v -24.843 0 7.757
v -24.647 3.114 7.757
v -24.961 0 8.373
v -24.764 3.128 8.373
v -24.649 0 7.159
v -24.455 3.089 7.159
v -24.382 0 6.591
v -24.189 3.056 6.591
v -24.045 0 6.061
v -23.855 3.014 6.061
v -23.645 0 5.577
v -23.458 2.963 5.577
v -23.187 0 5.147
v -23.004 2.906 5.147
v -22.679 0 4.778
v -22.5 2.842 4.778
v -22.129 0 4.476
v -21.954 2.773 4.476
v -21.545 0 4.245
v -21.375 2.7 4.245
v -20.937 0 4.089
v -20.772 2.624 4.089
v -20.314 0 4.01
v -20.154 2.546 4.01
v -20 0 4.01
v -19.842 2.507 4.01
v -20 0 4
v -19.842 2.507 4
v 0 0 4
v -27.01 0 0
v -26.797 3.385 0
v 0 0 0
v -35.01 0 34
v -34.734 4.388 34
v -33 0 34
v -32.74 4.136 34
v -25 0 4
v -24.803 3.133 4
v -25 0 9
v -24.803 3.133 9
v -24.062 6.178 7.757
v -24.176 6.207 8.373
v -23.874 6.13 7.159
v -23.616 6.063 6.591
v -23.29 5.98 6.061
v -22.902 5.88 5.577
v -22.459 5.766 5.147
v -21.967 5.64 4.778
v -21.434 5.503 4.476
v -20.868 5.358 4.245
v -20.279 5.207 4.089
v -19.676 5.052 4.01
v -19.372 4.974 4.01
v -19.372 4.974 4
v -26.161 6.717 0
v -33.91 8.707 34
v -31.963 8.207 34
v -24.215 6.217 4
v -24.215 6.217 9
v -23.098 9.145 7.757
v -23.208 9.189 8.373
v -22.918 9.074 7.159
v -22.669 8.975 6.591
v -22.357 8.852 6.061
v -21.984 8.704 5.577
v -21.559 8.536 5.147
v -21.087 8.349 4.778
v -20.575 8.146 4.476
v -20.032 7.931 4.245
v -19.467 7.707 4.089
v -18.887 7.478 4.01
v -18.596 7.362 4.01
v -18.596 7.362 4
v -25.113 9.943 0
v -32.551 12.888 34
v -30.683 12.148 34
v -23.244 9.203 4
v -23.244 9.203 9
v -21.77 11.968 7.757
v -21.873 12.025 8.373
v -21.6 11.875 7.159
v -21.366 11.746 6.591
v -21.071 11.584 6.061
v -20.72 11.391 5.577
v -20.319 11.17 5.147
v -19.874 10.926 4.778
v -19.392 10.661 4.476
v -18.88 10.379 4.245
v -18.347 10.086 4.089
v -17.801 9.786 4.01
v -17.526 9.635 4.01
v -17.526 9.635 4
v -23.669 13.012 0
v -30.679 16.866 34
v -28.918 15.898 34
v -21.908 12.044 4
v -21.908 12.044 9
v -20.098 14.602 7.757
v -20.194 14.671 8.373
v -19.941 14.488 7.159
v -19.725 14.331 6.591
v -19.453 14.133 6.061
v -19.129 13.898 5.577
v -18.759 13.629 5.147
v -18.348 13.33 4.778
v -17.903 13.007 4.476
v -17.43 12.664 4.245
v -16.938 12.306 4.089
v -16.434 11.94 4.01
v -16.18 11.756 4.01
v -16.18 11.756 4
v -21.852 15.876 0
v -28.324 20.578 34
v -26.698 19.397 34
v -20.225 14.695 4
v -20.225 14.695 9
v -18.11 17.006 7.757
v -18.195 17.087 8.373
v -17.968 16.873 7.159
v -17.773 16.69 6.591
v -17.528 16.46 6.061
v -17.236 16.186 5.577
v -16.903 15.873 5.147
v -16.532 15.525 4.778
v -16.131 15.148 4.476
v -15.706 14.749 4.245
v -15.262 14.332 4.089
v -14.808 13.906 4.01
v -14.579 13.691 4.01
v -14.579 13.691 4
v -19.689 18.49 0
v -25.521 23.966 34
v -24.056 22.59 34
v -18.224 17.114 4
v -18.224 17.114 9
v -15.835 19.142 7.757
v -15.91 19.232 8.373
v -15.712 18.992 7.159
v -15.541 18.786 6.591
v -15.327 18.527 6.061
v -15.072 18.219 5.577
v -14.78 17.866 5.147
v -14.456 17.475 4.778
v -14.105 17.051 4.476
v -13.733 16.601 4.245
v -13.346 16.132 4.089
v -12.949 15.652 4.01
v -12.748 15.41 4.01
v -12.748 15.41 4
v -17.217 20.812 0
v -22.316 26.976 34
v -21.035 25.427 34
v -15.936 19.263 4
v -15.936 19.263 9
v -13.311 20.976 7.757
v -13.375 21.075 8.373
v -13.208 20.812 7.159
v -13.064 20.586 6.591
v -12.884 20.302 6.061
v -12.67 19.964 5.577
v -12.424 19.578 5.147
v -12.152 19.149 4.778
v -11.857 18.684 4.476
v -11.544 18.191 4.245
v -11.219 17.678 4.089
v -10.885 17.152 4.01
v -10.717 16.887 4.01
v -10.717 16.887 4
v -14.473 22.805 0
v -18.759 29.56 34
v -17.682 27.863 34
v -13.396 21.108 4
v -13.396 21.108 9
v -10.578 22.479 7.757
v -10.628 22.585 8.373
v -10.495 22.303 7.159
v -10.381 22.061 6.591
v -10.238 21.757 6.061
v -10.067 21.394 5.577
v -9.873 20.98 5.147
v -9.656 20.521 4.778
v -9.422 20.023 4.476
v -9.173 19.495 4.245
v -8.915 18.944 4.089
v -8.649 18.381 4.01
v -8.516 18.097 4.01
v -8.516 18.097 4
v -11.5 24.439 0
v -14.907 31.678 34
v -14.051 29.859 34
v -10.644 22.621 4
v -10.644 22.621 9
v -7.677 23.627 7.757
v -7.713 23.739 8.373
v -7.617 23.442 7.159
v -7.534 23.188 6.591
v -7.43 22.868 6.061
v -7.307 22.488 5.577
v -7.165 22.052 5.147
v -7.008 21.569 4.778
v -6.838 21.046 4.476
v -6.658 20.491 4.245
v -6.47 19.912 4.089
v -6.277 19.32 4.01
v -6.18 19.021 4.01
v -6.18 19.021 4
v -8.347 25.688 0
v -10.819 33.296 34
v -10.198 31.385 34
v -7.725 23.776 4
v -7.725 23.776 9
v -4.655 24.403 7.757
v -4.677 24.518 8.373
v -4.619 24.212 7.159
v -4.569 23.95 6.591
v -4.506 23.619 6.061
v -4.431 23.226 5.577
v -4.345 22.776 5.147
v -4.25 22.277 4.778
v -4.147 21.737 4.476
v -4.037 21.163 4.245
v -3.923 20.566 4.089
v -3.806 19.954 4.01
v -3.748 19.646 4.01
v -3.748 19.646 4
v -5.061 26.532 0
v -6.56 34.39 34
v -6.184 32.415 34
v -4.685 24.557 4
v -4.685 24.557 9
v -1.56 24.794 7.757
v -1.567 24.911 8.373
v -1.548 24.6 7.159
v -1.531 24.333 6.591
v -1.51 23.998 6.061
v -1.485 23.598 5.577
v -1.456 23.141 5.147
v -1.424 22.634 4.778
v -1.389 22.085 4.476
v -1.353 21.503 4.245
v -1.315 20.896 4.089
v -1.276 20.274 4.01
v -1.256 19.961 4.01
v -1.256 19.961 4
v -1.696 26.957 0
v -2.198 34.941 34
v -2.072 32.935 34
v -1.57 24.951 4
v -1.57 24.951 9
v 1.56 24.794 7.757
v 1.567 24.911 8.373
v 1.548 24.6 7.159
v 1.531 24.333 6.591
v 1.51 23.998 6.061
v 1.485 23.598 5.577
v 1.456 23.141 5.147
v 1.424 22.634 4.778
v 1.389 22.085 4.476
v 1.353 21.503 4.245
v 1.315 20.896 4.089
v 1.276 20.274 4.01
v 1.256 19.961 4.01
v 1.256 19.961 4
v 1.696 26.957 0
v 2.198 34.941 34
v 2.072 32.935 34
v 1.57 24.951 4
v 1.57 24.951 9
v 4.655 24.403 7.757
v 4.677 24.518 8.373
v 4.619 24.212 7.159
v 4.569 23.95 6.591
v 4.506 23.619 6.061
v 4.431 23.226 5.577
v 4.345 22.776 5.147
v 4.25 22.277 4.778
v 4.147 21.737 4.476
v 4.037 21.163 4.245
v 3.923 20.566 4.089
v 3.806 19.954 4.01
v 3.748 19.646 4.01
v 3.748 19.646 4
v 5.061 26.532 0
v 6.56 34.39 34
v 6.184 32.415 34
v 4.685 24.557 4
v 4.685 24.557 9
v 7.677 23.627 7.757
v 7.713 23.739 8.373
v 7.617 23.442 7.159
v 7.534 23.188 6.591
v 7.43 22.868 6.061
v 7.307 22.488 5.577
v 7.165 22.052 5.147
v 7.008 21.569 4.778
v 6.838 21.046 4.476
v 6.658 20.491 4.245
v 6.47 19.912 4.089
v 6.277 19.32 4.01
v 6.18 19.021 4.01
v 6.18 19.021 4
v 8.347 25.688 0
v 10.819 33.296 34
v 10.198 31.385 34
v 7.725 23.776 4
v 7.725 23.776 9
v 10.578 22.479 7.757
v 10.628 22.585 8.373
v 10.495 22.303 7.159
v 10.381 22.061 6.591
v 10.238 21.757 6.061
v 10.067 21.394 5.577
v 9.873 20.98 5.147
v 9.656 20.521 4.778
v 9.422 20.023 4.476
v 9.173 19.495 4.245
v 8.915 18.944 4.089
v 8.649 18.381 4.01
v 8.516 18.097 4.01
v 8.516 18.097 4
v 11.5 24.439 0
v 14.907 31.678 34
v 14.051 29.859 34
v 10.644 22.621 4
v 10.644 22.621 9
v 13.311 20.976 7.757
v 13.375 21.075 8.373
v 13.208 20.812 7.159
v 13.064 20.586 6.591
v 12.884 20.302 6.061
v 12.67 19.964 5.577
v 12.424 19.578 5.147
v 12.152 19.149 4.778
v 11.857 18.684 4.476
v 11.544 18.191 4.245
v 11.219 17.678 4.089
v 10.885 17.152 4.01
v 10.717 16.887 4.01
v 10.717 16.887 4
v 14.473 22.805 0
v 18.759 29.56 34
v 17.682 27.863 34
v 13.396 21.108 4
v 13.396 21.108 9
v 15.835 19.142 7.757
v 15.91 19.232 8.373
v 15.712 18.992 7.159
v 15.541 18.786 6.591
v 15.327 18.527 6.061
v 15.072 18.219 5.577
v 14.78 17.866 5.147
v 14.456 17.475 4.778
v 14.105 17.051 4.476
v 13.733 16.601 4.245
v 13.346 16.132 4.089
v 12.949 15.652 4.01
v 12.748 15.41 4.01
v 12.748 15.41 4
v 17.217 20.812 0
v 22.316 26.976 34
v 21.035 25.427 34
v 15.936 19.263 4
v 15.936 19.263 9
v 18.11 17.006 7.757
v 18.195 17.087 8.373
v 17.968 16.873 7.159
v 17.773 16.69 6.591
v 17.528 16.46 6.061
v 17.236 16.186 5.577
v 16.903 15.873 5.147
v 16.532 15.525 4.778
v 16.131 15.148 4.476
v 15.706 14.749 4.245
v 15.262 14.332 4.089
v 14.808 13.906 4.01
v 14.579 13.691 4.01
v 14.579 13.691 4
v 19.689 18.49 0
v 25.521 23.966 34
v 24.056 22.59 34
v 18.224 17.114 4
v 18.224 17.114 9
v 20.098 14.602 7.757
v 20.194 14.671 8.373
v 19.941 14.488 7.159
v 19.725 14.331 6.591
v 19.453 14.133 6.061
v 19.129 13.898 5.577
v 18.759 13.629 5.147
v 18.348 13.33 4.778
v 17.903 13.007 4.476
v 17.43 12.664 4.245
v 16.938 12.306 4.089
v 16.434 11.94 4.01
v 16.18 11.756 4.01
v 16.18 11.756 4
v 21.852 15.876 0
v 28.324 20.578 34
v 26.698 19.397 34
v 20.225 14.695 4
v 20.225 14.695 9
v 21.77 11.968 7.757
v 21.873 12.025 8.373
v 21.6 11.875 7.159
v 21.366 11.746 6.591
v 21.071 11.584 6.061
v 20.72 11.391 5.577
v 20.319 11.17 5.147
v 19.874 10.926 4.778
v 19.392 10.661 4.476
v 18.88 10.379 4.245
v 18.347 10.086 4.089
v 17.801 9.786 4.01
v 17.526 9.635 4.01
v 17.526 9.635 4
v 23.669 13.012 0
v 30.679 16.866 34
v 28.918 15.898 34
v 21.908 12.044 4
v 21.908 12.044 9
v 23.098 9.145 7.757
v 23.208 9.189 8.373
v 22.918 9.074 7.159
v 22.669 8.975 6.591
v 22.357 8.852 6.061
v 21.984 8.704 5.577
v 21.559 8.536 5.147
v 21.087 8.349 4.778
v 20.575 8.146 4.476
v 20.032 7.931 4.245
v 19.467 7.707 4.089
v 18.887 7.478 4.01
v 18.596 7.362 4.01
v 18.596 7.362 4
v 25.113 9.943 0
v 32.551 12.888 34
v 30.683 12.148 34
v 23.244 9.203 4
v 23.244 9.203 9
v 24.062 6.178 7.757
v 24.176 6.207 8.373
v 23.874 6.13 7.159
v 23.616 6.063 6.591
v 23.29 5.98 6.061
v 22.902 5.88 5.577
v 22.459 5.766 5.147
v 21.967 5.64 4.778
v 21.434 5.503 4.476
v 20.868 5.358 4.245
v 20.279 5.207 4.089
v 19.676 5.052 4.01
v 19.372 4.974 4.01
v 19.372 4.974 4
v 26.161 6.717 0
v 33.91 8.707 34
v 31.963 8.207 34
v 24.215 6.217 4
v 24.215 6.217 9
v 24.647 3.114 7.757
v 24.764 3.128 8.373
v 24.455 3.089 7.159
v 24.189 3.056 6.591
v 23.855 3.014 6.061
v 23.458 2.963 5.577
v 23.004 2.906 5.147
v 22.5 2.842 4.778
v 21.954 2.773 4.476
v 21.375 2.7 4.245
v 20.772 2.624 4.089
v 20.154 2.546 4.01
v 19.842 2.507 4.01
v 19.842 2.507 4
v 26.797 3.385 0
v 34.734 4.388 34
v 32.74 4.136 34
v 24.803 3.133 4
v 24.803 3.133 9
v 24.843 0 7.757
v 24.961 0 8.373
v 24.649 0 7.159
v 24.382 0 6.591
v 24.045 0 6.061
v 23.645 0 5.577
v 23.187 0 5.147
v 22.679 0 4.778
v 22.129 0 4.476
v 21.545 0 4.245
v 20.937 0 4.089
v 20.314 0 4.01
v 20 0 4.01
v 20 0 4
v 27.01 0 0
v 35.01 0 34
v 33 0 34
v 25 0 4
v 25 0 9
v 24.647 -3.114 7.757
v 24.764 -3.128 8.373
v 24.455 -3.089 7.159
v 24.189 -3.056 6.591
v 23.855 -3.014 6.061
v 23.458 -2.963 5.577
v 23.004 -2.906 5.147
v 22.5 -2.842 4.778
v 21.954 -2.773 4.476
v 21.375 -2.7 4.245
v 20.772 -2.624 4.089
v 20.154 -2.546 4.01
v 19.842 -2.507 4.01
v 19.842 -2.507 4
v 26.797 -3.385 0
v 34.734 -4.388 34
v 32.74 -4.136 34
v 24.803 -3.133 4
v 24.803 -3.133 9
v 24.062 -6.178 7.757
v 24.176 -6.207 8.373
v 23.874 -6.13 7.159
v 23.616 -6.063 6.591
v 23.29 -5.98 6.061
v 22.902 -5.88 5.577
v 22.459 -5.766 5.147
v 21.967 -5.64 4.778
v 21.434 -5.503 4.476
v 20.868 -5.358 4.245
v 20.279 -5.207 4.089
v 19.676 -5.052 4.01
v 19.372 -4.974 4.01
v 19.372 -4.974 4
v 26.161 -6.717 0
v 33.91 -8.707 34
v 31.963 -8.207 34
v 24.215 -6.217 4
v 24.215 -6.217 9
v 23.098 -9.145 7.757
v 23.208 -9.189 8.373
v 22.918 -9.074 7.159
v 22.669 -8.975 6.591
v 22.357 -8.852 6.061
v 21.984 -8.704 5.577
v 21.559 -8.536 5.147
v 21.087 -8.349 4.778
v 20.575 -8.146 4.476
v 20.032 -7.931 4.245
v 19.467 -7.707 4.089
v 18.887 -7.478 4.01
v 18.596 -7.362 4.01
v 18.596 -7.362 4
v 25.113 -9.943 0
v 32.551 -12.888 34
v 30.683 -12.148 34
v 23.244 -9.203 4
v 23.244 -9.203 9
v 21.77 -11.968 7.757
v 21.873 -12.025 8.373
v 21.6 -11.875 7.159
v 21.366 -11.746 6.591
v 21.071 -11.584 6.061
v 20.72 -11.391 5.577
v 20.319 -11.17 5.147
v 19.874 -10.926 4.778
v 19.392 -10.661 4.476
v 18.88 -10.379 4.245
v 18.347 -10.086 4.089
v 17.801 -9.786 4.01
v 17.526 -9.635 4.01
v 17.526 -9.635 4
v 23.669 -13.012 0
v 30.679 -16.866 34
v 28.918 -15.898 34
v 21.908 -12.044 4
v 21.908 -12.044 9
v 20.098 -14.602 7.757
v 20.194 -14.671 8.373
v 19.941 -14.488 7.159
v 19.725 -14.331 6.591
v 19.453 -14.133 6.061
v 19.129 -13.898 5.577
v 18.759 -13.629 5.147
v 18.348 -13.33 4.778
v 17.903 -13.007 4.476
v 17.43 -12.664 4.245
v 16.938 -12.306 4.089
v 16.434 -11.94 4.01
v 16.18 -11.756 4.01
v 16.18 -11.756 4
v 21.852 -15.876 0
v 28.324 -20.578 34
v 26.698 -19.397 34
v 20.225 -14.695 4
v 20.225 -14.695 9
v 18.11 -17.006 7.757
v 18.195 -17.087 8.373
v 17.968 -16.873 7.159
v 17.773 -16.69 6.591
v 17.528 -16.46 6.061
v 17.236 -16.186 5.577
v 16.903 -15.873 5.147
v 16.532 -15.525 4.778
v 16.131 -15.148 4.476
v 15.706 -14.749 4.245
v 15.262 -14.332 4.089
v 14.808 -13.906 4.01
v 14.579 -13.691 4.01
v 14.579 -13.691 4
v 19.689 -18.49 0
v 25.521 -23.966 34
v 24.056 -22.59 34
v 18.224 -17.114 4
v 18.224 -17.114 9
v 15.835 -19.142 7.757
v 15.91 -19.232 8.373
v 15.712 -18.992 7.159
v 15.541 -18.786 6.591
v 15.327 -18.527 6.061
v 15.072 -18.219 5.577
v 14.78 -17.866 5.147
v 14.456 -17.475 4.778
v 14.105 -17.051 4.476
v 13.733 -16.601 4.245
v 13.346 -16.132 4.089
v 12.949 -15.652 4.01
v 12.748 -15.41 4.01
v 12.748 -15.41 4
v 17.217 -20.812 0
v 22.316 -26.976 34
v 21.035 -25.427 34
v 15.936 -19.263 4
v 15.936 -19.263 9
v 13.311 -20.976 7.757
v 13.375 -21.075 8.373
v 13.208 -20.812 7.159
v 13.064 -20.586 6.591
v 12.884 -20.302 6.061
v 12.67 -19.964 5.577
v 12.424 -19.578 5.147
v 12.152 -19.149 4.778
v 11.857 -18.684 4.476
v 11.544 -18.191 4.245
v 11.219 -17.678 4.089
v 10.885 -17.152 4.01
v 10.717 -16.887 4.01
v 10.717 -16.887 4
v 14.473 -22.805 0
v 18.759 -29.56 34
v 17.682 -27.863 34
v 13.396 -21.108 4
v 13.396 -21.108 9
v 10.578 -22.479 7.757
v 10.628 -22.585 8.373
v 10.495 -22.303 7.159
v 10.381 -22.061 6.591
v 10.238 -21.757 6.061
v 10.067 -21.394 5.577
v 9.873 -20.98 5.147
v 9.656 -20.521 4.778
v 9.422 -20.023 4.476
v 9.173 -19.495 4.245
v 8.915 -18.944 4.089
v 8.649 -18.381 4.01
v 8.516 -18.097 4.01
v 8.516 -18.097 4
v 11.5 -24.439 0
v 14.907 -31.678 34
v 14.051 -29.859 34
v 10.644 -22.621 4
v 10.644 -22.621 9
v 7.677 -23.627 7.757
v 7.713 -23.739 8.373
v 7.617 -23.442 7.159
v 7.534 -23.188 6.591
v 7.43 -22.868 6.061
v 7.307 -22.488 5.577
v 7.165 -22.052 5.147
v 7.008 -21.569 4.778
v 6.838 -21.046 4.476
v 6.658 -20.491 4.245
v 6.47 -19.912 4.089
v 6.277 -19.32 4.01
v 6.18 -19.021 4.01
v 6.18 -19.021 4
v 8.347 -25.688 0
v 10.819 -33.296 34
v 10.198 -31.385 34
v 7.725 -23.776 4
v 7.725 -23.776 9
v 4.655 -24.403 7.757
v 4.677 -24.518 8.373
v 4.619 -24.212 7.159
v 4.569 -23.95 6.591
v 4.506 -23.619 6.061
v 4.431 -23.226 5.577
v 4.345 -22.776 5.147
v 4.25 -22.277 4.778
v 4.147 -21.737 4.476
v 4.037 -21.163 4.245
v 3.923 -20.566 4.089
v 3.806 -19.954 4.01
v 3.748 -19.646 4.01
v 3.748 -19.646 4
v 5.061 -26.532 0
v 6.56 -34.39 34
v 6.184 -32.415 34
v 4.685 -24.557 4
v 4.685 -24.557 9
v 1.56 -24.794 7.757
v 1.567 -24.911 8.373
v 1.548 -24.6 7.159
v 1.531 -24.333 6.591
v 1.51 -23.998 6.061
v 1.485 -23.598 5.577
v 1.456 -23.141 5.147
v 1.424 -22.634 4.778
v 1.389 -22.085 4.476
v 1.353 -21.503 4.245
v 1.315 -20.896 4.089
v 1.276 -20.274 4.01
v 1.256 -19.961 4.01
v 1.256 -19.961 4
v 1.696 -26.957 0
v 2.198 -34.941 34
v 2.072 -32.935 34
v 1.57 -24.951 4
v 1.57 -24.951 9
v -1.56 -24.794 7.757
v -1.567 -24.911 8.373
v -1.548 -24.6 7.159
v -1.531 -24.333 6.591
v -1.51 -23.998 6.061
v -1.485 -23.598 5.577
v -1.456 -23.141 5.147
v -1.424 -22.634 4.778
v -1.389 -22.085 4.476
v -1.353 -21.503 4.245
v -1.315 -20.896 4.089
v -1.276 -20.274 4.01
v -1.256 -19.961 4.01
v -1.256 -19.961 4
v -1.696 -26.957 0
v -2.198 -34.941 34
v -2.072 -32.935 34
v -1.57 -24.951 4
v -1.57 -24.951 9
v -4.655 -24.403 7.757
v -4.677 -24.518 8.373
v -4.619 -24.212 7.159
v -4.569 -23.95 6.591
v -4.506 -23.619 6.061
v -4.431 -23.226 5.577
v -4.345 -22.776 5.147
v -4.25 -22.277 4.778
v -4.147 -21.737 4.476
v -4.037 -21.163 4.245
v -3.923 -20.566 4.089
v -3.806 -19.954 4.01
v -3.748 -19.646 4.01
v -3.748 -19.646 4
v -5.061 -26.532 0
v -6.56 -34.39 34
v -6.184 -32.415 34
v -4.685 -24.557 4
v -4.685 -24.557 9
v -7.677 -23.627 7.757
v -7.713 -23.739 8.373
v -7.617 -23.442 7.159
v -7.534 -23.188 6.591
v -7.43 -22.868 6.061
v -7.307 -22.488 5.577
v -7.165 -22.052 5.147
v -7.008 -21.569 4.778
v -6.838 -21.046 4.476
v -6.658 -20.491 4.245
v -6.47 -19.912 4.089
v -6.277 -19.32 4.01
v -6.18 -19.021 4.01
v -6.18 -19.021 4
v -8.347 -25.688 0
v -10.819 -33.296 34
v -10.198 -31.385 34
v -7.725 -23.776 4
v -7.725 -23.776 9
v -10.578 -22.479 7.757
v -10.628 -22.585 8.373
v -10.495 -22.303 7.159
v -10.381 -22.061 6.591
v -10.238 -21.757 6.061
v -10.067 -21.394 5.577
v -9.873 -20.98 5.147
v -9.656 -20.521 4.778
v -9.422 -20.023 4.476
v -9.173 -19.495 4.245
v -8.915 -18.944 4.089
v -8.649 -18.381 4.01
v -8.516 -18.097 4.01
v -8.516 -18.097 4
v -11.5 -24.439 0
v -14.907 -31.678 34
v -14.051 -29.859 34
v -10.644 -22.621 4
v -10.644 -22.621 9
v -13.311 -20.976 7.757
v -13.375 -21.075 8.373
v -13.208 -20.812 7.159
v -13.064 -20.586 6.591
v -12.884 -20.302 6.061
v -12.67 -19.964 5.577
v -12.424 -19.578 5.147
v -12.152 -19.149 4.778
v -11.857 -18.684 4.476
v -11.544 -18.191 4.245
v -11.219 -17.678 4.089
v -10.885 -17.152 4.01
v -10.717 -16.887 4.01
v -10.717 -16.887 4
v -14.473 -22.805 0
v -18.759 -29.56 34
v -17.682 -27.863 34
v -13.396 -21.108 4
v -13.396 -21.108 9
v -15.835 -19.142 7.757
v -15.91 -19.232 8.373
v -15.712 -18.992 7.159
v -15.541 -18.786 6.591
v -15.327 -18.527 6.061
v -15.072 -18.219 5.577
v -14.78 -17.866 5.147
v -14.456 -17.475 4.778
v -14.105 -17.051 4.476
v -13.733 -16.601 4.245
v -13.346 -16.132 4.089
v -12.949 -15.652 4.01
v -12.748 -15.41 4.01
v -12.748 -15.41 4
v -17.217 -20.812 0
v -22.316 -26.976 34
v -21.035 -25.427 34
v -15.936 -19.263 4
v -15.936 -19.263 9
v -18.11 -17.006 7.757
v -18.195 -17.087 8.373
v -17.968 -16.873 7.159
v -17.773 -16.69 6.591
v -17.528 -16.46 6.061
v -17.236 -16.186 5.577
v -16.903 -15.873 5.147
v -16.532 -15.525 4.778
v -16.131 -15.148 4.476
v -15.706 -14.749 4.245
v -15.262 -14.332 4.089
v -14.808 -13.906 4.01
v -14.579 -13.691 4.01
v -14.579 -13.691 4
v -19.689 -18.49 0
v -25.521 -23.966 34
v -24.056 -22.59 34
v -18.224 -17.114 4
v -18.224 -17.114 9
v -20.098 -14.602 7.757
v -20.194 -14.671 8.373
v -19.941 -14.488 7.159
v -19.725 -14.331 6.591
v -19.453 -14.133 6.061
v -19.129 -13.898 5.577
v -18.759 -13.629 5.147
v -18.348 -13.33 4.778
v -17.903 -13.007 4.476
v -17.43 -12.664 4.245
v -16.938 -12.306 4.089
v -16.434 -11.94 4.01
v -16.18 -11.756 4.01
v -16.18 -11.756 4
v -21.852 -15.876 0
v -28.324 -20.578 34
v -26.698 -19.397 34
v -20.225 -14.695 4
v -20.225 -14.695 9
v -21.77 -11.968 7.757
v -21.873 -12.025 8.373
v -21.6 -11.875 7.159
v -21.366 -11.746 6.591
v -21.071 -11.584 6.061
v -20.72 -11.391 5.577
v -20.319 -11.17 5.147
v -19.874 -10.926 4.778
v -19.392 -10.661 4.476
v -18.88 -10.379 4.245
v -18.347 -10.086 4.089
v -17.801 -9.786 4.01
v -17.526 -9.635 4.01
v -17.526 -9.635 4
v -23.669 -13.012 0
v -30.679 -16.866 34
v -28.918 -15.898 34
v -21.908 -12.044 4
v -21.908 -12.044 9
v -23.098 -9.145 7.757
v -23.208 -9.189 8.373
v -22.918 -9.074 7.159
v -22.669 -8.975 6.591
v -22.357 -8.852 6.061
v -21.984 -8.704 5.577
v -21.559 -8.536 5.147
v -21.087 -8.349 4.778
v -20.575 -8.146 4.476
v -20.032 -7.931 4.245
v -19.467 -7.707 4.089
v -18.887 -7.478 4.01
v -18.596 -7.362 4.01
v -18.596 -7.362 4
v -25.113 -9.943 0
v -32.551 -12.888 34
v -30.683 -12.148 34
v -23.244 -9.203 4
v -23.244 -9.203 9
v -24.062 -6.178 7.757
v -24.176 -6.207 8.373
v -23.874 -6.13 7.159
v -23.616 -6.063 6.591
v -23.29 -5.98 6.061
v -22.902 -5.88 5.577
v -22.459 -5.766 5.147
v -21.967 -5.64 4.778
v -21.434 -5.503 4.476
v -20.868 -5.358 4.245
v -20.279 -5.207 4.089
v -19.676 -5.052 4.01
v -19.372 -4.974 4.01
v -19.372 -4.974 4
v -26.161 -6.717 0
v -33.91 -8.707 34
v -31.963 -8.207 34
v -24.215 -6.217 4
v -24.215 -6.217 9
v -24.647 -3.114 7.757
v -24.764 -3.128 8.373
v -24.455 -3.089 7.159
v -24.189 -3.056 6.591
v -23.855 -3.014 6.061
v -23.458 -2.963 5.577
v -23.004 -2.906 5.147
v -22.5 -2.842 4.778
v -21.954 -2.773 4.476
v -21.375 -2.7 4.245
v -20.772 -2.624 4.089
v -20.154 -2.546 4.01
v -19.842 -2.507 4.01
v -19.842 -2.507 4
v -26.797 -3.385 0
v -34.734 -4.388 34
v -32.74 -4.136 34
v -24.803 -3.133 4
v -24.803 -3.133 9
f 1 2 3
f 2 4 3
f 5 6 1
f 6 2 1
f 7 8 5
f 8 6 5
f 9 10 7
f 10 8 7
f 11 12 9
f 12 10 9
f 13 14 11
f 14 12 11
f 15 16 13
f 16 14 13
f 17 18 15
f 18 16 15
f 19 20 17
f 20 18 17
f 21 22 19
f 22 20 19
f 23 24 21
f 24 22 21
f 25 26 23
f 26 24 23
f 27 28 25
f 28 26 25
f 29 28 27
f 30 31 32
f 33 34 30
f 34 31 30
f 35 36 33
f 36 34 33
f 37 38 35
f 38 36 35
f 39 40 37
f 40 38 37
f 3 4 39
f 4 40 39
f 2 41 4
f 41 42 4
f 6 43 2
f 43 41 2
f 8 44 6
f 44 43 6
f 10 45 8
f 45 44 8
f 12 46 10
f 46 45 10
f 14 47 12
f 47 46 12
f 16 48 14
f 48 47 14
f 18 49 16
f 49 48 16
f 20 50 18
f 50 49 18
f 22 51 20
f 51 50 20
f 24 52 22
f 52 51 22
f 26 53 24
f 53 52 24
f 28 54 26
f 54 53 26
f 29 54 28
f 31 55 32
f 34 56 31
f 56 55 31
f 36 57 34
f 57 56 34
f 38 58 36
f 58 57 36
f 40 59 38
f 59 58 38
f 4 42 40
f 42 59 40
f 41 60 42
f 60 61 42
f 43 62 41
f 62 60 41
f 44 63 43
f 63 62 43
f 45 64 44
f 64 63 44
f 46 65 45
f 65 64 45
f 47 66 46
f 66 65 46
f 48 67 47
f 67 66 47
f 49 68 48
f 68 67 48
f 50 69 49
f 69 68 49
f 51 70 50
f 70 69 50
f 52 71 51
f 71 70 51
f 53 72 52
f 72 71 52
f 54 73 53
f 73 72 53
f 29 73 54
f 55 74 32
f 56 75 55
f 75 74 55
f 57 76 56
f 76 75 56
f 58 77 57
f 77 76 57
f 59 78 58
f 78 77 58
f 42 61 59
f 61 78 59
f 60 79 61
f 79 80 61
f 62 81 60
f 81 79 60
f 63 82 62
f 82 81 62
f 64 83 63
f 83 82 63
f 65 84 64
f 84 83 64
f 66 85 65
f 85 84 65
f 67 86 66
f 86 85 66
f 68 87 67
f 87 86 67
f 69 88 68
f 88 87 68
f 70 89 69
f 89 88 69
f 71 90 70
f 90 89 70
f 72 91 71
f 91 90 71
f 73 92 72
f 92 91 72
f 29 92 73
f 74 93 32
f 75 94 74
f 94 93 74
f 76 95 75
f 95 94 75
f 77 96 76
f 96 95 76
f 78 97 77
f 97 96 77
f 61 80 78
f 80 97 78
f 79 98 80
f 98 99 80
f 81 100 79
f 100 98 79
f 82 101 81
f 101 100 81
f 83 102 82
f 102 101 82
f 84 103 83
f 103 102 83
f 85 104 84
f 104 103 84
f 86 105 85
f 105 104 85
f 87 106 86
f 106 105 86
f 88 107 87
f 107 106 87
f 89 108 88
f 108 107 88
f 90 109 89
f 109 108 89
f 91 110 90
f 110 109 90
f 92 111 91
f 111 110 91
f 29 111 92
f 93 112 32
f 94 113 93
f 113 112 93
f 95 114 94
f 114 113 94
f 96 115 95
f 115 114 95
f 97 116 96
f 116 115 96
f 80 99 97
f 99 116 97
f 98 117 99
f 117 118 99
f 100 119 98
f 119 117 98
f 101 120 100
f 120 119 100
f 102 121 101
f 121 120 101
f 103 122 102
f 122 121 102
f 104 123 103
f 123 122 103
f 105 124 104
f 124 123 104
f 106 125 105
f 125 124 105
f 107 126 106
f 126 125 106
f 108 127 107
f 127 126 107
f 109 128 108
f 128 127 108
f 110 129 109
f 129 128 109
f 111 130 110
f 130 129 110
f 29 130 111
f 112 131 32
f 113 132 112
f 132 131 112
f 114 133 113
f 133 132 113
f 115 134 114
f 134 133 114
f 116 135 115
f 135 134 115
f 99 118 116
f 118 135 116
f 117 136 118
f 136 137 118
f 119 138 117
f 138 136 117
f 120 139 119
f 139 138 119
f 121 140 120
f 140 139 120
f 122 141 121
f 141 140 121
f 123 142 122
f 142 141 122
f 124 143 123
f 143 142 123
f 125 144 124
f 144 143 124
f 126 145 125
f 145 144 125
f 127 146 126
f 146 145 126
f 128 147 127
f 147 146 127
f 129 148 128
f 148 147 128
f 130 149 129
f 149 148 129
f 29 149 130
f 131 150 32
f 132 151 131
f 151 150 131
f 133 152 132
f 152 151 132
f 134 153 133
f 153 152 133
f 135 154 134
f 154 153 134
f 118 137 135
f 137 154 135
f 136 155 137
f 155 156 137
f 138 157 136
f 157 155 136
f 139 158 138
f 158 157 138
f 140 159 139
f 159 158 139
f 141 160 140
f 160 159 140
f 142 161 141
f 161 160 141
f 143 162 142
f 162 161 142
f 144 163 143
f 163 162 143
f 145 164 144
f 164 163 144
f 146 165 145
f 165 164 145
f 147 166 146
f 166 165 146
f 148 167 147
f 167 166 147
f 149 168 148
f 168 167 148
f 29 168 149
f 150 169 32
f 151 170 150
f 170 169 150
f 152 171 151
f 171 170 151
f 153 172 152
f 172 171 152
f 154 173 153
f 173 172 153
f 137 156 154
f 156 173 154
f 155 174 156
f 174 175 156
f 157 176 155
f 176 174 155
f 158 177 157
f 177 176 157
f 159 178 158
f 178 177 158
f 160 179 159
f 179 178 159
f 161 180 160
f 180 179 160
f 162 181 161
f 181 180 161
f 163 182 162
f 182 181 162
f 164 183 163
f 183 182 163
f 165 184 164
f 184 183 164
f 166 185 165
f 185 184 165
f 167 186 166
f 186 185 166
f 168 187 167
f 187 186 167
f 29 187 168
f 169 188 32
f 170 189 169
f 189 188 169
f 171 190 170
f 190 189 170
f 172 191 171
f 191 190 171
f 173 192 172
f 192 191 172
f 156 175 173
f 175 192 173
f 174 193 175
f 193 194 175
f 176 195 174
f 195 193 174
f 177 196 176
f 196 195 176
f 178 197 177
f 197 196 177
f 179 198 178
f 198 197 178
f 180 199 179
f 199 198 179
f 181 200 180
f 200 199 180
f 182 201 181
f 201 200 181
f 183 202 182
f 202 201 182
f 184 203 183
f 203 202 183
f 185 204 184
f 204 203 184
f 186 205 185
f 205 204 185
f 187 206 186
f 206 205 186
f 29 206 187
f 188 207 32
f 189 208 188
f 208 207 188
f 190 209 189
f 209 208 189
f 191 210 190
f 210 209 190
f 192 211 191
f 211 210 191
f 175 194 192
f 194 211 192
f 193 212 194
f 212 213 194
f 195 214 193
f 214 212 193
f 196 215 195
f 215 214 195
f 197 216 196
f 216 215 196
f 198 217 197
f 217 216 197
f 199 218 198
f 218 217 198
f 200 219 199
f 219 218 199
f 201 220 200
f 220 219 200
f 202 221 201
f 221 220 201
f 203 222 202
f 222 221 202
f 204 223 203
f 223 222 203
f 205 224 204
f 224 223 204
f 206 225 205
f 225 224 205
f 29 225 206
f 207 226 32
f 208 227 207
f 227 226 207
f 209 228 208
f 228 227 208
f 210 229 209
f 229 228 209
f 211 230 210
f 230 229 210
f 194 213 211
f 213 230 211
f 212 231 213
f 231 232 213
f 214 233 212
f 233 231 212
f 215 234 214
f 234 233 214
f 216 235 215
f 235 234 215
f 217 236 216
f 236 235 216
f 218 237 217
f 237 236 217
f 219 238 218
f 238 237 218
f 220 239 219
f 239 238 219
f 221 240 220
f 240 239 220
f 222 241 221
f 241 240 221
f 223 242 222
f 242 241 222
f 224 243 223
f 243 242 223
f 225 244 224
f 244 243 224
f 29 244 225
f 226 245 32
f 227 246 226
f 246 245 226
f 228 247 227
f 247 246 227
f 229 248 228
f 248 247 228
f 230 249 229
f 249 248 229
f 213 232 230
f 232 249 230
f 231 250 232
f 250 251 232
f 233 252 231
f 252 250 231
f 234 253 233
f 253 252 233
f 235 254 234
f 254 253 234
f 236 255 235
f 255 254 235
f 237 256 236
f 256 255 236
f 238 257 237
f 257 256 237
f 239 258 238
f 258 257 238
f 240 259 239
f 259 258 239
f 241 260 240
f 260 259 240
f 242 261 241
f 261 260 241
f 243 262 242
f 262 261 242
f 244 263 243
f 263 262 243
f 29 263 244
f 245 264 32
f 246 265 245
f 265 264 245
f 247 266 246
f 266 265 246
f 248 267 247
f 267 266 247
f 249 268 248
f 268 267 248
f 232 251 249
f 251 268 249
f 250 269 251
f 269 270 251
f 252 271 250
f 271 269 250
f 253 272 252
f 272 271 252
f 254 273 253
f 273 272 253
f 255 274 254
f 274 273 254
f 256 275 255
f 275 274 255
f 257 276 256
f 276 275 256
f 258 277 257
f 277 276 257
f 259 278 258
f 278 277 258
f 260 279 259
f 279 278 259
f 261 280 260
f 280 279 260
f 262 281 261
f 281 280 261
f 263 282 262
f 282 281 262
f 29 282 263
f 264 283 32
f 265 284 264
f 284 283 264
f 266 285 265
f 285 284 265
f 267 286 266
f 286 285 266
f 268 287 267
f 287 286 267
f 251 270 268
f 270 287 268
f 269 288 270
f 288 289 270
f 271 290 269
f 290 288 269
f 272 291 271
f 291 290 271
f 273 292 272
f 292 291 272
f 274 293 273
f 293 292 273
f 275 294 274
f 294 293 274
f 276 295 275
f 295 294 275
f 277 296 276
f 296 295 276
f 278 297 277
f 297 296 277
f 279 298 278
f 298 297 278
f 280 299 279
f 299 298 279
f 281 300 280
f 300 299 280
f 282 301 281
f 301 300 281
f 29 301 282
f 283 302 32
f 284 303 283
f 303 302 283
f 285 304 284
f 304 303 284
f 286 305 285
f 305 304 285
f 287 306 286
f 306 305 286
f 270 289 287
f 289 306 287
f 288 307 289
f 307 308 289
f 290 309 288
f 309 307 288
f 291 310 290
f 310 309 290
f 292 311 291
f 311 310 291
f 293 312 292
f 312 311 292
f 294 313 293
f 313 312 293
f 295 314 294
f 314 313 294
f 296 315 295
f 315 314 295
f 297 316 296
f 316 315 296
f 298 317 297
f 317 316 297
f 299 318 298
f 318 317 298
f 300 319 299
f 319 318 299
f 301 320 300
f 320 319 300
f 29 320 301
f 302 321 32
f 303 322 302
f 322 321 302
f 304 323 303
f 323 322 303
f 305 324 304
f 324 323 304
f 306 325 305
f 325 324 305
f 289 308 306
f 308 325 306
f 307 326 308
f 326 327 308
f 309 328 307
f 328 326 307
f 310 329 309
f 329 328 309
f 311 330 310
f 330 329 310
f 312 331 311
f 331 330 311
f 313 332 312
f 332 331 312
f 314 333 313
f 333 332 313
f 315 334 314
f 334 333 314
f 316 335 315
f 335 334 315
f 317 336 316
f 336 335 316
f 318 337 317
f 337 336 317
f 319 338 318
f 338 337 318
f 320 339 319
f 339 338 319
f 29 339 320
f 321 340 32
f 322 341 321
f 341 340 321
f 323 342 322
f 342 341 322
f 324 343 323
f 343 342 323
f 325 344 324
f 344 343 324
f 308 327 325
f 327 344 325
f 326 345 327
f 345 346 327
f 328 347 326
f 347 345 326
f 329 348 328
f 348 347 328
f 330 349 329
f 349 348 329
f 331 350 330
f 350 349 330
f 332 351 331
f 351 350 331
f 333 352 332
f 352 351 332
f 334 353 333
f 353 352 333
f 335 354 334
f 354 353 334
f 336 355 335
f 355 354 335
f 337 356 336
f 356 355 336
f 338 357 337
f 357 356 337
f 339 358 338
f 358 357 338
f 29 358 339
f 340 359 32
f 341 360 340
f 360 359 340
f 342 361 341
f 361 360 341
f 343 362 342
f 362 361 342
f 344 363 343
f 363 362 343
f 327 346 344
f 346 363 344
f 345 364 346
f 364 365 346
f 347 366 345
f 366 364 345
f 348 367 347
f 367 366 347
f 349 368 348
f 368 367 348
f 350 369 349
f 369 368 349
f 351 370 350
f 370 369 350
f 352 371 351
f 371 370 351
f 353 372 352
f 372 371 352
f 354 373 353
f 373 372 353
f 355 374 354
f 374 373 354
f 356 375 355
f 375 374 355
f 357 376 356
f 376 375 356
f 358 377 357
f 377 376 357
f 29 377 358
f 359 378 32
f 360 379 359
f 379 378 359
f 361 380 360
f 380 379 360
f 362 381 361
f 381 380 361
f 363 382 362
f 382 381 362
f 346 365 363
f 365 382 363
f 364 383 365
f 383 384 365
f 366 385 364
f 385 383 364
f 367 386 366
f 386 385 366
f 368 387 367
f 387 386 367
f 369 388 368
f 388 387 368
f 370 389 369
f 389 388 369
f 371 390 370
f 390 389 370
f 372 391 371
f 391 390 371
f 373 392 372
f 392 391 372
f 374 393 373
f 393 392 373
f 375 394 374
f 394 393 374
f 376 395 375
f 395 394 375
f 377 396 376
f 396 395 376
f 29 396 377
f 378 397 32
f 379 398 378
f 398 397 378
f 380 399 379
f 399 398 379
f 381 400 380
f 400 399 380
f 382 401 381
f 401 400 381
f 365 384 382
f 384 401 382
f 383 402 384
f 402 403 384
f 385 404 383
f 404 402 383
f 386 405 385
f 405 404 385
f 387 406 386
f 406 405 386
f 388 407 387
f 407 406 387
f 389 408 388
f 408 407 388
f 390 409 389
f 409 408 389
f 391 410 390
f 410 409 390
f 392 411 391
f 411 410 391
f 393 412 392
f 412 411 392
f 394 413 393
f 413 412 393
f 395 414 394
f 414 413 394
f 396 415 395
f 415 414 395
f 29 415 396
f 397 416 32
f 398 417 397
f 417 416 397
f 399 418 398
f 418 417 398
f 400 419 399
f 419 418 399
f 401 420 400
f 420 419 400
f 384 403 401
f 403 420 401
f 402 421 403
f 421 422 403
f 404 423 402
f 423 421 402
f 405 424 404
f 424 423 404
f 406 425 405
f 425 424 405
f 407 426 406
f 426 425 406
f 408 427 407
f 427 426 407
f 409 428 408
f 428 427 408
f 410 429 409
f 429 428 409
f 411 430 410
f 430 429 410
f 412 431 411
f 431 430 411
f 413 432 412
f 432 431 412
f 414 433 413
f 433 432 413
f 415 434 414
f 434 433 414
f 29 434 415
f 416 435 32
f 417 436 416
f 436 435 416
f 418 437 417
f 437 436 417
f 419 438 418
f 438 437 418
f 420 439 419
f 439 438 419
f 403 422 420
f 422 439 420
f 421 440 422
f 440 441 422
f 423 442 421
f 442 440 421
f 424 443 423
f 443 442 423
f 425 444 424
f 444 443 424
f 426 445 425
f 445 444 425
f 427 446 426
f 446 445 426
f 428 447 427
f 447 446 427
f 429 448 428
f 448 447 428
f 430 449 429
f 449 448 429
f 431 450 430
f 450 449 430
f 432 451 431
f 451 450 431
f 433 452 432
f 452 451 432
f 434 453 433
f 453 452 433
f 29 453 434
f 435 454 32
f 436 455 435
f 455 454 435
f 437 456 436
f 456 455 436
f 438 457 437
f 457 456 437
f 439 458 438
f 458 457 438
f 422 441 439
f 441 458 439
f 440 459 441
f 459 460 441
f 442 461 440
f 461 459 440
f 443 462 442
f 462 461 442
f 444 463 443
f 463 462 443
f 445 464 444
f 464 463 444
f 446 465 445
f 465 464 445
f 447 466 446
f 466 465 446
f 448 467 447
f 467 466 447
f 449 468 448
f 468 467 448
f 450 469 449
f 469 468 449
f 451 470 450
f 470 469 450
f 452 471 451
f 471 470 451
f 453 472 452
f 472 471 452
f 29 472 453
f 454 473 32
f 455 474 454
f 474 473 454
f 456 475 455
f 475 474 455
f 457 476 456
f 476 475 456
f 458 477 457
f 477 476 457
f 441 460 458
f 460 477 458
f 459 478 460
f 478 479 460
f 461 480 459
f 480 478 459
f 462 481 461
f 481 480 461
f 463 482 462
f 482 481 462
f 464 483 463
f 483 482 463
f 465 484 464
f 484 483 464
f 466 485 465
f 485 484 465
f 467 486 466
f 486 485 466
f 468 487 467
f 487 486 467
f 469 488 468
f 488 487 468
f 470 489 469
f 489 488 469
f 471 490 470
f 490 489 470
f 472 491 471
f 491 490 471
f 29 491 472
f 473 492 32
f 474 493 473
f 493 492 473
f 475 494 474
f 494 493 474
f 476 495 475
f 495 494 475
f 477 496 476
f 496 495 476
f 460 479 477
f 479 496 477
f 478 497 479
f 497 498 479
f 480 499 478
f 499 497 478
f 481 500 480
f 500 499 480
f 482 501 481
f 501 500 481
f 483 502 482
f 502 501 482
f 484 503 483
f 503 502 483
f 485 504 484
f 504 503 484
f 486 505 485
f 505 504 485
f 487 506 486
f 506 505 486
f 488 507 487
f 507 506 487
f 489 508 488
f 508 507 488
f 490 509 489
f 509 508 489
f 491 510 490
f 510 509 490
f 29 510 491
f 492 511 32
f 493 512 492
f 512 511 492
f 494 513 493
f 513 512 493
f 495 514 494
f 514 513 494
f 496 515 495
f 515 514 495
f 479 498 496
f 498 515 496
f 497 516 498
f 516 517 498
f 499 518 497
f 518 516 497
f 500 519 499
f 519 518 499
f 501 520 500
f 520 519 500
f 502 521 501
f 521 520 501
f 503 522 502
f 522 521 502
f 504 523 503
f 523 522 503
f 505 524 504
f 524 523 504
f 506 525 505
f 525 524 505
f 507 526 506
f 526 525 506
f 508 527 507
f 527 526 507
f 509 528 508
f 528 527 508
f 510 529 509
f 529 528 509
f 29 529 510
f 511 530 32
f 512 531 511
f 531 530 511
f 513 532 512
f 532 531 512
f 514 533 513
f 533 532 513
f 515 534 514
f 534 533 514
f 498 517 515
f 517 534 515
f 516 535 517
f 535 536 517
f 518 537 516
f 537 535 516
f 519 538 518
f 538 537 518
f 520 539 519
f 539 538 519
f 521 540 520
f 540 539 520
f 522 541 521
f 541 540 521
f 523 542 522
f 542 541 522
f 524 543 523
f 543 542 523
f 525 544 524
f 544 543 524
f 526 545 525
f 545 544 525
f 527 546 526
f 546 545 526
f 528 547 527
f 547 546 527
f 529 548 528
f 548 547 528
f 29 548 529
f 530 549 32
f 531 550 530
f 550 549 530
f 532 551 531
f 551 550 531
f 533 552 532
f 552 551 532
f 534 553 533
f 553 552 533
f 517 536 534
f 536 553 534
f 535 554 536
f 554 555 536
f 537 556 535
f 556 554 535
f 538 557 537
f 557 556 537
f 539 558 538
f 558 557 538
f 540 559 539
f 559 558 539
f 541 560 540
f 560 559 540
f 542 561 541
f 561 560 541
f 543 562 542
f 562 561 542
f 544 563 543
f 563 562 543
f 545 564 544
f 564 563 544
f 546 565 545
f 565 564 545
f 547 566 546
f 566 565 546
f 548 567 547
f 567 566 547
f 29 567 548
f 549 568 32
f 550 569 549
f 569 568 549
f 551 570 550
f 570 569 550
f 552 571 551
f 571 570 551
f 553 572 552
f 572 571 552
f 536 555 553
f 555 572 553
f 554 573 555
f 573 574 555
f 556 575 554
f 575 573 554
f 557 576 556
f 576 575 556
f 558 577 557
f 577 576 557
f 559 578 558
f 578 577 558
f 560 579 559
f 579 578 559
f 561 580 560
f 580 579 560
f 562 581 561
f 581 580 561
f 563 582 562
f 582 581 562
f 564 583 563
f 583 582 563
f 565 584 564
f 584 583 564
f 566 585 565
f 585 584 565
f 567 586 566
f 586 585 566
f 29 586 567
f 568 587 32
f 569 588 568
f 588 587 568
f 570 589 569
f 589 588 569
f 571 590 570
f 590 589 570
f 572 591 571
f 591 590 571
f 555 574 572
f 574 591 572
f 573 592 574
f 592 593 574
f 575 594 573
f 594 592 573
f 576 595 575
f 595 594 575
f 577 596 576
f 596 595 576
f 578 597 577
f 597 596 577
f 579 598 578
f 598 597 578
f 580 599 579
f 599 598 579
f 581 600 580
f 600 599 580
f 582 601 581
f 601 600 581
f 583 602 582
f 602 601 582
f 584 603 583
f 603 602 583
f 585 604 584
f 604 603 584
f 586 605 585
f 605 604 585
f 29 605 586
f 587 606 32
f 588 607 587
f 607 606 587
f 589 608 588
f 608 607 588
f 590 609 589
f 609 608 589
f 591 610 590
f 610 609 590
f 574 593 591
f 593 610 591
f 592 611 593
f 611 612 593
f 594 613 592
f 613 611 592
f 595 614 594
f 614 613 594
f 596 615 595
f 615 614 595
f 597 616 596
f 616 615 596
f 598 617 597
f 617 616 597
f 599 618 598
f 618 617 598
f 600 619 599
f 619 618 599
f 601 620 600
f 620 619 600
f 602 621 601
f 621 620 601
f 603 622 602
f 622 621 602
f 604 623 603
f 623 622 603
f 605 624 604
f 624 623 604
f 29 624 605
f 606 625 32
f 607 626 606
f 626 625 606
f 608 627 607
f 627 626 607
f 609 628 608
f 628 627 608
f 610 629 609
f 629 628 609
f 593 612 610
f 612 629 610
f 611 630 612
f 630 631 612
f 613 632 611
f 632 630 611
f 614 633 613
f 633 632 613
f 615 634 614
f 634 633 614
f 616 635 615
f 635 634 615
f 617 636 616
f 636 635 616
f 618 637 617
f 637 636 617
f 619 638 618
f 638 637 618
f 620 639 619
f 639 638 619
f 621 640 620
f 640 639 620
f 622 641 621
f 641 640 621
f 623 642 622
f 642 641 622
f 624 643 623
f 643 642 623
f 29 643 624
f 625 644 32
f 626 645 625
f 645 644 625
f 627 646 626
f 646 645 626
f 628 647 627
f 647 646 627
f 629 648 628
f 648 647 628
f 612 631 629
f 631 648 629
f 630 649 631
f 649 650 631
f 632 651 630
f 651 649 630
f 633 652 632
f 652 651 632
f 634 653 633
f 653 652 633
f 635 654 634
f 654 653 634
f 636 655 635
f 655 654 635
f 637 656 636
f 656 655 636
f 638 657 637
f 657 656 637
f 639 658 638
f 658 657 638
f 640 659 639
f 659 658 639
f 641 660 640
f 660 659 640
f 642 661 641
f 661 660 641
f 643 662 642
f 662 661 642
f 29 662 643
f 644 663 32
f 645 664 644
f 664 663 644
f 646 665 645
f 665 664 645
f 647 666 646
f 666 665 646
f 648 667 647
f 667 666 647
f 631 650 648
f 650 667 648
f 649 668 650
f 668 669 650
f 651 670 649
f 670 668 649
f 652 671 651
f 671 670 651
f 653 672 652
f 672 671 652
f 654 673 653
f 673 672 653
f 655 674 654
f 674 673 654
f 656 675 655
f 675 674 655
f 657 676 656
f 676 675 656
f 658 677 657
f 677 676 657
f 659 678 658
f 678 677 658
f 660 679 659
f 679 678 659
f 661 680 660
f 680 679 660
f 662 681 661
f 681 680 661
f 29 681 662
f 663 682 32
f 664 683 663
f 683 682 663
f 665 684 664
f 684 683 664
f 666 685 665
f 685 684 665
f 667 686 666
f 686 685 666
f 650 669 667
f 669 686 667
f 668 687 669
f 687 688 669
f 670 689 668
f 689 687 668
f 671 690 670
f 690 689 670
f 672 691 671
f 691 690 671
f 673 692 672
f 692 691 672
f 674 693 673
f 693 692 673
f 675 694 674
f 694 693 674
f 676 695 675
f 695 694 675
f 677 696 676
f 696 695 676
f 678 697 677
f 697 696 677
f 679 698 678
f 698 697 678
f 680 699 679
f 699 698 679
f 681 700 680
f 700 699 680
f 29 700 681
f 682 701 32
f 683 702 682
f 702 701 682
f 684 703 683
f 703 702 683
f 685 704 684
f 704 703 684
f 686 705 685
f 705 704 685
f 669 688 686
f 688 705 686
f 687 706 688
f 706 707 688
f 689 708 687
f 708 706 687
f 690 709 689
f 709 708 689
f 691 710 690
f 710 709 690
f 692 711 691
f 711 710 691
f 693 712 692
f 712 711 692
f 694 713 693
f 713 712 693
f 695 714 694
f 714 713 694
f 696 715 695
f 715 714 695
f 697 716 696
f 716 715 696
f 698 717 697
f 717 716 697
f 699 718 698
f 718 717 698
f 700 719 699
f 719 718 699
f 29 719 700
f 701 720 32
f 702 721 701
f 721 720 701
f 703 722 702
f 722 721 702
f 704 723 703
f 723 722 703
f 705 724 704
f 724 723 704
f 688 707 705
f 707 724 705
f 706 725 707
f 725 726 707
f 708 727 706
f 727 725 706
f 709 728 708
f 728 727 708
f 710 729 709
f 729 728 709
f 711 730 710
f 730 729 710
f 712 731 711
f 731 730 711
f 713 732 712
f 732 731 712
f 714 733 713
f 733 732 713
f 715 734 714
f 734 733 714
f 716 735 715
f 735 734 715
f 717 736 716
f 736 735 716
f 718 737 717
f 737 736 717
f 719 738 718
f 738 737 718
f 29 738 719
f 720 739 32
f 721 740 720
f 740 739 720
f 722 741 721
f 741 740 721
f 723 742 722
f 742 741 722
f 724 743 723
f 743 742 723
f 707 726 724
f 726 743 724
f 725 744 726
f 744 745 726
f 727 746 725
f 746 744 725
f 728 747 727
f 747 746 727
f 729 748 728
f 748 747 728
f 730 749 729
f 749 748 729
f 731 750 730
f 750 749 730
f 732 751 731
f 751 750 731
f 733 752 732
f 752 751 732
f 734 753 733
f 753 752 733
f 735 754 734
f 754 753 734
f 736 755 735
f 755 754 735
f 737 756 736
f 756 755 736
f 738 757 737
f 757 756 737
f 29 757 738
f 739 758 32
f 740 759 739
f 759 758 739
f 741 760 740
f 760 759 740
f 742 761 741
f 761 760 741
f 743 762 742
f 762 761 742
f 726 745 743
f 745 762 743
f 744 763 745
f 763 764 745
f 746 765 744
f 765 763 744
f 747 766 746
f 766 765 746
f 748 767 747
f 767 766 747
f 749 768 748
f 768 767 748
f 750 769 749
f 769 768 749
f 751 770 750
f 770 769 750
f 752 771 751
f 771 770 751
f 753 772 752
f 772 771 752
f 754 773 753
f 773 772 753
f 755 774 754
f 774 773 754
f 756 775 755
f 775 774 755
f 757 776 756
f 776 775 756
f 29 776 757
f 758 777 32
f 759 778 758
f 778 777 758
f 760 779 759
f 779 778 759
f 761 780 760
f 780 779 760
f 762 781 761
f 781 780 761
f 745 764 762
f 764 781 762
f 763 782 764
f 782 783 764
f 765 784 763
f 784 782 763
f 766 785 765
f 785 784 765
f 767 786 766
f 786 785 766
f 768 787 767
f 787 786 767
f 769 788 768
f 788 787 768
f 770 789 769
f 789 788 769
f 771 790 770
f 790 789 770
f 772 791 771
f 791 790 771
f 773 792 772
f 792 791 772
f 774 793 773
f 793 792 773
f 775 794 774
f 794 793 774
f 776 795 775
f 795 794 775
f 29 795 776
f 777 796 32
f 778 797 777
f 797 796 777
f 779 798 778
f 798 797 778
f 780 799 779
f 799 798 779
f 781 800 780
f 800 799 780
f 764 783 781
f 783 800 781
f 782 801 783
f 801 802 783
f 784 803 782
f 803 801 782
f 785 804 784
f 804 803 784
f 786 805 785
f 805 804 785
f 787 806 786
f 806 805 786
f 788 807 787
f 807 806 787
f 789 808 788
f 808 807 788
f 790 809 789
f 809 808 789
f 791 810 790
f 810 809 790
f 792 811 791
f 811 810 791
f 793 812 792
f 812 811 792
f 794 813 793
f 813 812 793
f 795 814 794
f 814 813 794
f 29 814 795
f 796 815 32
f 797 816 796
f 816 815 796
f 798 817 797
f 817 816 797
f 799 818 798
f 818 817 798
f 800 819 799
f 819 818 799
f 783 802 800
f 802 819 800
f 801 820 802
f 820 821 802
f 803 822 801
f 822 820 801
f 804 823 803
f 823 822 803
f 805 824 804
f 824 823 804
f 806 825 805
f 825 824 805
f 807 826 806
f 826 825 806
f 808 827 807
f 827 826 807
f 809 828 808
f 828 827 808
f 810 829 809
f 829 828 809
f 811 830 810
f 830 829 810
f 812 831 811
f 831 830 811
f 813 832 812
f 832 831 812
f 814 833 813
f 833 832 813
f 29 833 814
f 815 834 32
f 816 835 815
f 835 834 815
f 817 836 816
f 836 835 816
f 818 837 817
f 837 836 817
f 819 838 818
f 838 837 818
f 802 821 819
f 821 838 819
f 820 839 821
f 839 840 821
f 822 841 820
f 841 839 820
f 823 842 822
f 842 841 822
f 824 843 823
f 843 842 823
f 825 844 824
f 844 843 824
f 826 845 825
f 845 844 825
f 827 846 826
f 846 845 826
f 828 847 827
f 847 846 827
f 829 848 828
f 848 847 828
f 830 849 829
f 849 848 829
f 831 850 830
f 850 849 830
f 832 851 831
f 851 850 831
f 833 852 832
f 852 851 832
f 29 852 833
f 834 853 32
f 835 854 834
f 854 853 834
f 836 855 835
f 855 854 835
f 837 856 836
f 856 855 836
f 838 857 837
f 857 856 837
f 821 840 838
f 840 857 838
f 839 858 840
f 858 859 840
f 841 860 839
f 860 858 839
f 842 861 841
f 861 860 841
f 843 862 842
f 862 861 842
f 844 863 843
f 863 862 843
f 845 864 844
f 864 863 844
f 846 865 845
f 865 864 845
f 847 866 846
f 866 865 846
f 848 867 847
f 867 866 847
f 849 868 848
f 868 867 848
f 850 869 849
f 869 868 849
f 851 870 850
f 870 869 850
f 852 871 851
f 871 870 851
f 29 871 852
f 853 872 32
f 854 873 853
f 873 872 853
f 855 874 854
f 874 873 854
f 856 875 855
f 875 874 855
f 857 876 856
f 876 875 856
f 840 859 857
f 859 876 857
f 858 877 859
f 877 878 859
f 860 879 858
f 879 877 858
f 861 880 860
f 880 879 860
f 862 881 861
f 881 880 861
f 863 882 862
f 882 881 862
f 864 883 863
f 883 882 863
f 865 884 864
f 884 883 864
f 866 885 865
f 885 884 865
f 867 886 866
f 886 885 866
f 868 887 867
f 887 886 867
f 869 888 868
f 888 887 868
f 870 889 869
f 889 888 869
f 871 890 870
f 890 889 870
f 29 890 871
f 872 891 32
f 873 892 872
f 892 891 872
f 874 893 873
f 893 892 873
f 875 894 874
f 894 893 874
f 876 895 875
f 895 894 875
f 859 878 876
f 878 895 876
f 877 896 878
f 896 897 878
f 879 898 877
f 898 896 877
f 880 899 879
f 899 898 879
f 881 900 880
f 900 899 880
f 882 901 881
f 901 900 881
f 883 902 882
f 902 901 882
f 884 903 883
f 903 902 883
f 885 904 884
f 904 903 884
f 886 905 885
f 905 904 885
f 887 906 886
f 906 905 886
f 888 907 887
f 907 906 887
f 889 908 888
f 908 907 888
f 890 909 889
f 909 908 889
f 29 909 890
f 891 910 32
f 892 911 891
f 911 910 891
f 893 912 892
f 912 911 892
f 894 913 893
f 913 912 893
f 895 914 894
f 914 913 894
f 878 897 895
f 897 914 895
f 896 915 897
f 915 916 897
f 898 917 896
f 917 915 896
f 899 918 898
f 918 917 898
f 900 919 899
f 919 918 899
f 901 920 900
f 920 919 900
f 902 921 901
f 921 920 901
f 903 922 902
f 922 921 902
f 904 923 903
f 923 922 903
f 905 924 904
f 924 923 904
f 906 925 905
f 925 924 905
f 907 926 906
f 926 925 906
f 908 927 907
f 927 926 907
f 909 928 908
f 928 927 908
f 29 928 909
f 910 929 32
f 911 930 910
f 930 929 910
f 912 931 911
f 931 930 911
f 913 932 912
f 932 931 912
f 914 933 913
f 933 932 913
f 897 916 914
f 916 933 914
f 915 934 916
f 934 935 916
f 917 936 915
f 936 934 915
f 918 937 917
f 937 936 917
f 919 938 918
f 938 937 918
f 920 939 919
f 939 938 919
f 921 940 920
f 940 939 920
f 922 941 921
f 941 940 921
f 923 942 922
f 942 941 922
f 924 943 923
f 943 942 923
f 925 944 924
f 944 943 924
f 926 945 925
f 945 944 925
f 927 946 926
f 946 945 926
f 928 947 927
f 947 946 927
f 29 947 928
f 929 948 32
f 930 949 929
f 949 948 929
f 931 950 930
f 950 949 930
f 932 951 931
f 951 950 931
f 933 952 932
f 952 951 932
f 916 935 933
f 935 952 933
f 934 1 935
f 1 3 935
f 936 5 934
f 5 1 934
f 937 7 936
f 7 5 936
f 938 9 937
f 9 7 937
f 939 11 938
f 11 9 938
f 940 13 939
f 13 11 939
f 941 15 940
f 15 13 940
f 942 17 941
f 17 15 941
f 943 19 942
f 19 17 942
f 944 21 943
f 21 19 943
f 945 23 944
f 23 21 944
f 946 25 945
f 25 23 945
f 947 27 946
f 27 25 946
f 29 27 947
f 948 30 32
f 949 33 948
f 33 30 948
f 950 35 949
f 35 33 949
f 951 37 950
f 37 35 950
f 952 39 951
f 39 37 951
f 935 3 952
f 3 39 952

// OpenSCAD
// file: ../third_party/openscad-fillets/fillets2d.scad
/*
Modified by Kevin Gravier
https://www.thingiverse.com/mrkmg/about

Originally from: https://github.com/OskarLinde/scad-utils/blob/master/morphology.scad



Modules:

rounding2d(r)
r = radius of rounding

fillet2d(r)
r = radius of rounding

*/

$fa = 0.1;
$fs = 0.1;

// Example
linear_extrude(1)
rounding2d(1)
fillet2d(1)
difference() {
    union() {
        square([10, 10], center = true);
        translate([5, 5])
        square([10, 10], center = true);
    }
    
    translate([-5, -5])
    square([10, 10], center = true);
    
    translate([8, 8])
    circle(3);
}

// Example, text
translate([-20, -15])
rotate([0, 0, 0])
linear_extrude(1)
rounding2d(.25)
fillet2d(.25)
text("Fillets!");

module fillet2d(r) {
    offset(r = -r) offset(delta = r) children(0);
}

module rounding2d(r) {
    offset(r = r) offset(delta = -r) children(0);
}
// file: ../third_party/openscad-fillets/fillets3d.scad
/*
Created by Kevin Gravier
https://www.thingiverse.com/mrkmg/about

My take on a top and bottom fillet for a 3d shape.

Available Modules:

topBottomFillet(b, t, r, s, e)
b = z of bottom of 3d object
t = z of top of 3d object
r = radius of fillet
s = steps of filler (smaller is smoother)
e = enabled (pass e = 0 to disable fillet for faster preview)

topFillet(t, r, s, e)
t = z of top of 3d object
r = radius of fillet
s = steps of filler (smaller is smoother)
e = enabled (pass e = 0 to disable fillet for faster preview)

bottomFillet(b, r, s, e)
b = z of bottom of 3d object
r = radius of fillet
s = steps of filler (smaller is smoother)
e = enabled (pass e = 0 to disable fillet for faster preview)

*/

enable = 1;

// Example, hard edges
translate([0, 20, 0])
topBottomFillet(b = 0, t = 10, r = 2, s = 20, e = enable)
linear_extrude(10, scale = 1.2)
difference() {
    union() {
        square([10, 10], true);
        translate([-15, 0]) circle(15);
    }
    translate([-15, 0]) circle(8);
    translate([-15, 0]) square([13, 13], center = true);
}

// Example, soft edges
use <fillets2d.scad>;
translate([0, -20, 0])
topBottomFillet(b = 0, t = 10, r = 1, s = 10, e = enable)
linear_extrude(10)
rounding2d(1)
fillet2d(1)
difference() {
    union() {
        square([10, 10], true);
        translate([-15, 0]) circle(15);
    }
    translate([-15, 0]) circle(8);
    translate([-15, 0]) square([13, 13], center = true);
}


// Example, text
translate([-60, 40])
rotate([0, 0, -90])
topBottomFillet(b = 0, t = 3, r = .5, s = 5, e = enable)
linear_extrude(3)
text("Fillets!", size = 20);


// Library

function filletDepth(r, d, i) = r * cos(asin(d * i / r));

module topBottomFillet(b = 0, t = 2, r = 1, s = 4, e = 1) {
    if (e == 1) {        
        topFilletPeice(t = t, r = r, s = s) children(0);
        bottomFilletPeice(b = b, r = r, s = s) children(0);
        
        render()
        difference() {
            children(0);
            
            translate([0, 0, t - r])
            linear_extrude(r + 1)
            offset(delta = 1e5)
            projection()
            children(0);
            
            translate([0, 0, b - 1])
            linear_extrude(r + 1)
            offset(delta = 1e5)
            projection()
            children(0);
            
        }
    }
    if (e == 0) children(0);
}

module topFillet(t = 2, r = 1, s = 4, e = 1) {
    if (e == 1) {
        topFilletPeice(t = t, r = r, s = s) children(0);
        
        render()
        difference() {
            children(0);
            translate([0, 0, t-r])
            linear_extrude(r + 1)
            offset(delta = 1e5)
            projection()
            children(0);
        }
    }
    if (e == 0) children(0);
}

module bottomFillet(b = 0, r = 1, s = 4, e = 1) {
    if (e == 1) {
        bottomFilletPeice(b = b, r = r, s = s) children(0);
        
        render()
        difference() {
            children(0);
            translate([0, 0, b - r - 1])
            linear_extrude(r + 1)
            offset(delta = 1e5)
            projection()
            children(0);
        }
    }
    if (e == 0) children(0);
}

module topFilletPeice(t = 2, r = 1, s = 4) {
    d = r/s;
        
    for (i = [0:s]) {
        x = filletDepth(r, d, i);
        z = d * (s - i + 1);                  
        translate([0, 0, t - z]) 
        linear_extrude(d) 
        offset(delta = -r + x) 
        projection(true) 
        translate([0, 0, -t + z])
        children(0);
    }
}

module bottomFilletPeice(b = 0, r =1, s = 4) {
    d = r/s;
        
    for (i = [0:s]) {
        x = filletDepth(r, d, i);
        z = d * (s - i);
        translate([0, 0, b + z]) 
        linear_extrude(d) 
        offset(delta = -r + x) 
        projection(true)
        translate([0, 0, b - z])
        children(0);
    }
}
// main file
use <../third_party/openscad-fillets/fillets3d.scad>

$fn=50;
epsilon = 0.01;

wall = 2.01;
base_diameter = 50;
base_height = 4;
flare = 8;
height = 30;
fillet = 5;

rotate_extrude(convexity = 10) {
    points = [
        [0, 0], [base_diameter / 2 + wall, 0], [base_diameter / 2 + wall + flare, base_height + height],
        [base_diameter / 2 + flare, base_height + height], [base_diameter / 2, base_height], [0, base_height],
        [0, 0],
        ];
    polygon(points);

    difference() {
        translate([base_diameter / 2 - fillet, base_height, 0]) {
            square(size = fillet, center = false);
        }
        translate([base_diameter / 2 - fillet, fillet + base_height, 0]) {
            circle(r = fillet);
        }
    }
}
